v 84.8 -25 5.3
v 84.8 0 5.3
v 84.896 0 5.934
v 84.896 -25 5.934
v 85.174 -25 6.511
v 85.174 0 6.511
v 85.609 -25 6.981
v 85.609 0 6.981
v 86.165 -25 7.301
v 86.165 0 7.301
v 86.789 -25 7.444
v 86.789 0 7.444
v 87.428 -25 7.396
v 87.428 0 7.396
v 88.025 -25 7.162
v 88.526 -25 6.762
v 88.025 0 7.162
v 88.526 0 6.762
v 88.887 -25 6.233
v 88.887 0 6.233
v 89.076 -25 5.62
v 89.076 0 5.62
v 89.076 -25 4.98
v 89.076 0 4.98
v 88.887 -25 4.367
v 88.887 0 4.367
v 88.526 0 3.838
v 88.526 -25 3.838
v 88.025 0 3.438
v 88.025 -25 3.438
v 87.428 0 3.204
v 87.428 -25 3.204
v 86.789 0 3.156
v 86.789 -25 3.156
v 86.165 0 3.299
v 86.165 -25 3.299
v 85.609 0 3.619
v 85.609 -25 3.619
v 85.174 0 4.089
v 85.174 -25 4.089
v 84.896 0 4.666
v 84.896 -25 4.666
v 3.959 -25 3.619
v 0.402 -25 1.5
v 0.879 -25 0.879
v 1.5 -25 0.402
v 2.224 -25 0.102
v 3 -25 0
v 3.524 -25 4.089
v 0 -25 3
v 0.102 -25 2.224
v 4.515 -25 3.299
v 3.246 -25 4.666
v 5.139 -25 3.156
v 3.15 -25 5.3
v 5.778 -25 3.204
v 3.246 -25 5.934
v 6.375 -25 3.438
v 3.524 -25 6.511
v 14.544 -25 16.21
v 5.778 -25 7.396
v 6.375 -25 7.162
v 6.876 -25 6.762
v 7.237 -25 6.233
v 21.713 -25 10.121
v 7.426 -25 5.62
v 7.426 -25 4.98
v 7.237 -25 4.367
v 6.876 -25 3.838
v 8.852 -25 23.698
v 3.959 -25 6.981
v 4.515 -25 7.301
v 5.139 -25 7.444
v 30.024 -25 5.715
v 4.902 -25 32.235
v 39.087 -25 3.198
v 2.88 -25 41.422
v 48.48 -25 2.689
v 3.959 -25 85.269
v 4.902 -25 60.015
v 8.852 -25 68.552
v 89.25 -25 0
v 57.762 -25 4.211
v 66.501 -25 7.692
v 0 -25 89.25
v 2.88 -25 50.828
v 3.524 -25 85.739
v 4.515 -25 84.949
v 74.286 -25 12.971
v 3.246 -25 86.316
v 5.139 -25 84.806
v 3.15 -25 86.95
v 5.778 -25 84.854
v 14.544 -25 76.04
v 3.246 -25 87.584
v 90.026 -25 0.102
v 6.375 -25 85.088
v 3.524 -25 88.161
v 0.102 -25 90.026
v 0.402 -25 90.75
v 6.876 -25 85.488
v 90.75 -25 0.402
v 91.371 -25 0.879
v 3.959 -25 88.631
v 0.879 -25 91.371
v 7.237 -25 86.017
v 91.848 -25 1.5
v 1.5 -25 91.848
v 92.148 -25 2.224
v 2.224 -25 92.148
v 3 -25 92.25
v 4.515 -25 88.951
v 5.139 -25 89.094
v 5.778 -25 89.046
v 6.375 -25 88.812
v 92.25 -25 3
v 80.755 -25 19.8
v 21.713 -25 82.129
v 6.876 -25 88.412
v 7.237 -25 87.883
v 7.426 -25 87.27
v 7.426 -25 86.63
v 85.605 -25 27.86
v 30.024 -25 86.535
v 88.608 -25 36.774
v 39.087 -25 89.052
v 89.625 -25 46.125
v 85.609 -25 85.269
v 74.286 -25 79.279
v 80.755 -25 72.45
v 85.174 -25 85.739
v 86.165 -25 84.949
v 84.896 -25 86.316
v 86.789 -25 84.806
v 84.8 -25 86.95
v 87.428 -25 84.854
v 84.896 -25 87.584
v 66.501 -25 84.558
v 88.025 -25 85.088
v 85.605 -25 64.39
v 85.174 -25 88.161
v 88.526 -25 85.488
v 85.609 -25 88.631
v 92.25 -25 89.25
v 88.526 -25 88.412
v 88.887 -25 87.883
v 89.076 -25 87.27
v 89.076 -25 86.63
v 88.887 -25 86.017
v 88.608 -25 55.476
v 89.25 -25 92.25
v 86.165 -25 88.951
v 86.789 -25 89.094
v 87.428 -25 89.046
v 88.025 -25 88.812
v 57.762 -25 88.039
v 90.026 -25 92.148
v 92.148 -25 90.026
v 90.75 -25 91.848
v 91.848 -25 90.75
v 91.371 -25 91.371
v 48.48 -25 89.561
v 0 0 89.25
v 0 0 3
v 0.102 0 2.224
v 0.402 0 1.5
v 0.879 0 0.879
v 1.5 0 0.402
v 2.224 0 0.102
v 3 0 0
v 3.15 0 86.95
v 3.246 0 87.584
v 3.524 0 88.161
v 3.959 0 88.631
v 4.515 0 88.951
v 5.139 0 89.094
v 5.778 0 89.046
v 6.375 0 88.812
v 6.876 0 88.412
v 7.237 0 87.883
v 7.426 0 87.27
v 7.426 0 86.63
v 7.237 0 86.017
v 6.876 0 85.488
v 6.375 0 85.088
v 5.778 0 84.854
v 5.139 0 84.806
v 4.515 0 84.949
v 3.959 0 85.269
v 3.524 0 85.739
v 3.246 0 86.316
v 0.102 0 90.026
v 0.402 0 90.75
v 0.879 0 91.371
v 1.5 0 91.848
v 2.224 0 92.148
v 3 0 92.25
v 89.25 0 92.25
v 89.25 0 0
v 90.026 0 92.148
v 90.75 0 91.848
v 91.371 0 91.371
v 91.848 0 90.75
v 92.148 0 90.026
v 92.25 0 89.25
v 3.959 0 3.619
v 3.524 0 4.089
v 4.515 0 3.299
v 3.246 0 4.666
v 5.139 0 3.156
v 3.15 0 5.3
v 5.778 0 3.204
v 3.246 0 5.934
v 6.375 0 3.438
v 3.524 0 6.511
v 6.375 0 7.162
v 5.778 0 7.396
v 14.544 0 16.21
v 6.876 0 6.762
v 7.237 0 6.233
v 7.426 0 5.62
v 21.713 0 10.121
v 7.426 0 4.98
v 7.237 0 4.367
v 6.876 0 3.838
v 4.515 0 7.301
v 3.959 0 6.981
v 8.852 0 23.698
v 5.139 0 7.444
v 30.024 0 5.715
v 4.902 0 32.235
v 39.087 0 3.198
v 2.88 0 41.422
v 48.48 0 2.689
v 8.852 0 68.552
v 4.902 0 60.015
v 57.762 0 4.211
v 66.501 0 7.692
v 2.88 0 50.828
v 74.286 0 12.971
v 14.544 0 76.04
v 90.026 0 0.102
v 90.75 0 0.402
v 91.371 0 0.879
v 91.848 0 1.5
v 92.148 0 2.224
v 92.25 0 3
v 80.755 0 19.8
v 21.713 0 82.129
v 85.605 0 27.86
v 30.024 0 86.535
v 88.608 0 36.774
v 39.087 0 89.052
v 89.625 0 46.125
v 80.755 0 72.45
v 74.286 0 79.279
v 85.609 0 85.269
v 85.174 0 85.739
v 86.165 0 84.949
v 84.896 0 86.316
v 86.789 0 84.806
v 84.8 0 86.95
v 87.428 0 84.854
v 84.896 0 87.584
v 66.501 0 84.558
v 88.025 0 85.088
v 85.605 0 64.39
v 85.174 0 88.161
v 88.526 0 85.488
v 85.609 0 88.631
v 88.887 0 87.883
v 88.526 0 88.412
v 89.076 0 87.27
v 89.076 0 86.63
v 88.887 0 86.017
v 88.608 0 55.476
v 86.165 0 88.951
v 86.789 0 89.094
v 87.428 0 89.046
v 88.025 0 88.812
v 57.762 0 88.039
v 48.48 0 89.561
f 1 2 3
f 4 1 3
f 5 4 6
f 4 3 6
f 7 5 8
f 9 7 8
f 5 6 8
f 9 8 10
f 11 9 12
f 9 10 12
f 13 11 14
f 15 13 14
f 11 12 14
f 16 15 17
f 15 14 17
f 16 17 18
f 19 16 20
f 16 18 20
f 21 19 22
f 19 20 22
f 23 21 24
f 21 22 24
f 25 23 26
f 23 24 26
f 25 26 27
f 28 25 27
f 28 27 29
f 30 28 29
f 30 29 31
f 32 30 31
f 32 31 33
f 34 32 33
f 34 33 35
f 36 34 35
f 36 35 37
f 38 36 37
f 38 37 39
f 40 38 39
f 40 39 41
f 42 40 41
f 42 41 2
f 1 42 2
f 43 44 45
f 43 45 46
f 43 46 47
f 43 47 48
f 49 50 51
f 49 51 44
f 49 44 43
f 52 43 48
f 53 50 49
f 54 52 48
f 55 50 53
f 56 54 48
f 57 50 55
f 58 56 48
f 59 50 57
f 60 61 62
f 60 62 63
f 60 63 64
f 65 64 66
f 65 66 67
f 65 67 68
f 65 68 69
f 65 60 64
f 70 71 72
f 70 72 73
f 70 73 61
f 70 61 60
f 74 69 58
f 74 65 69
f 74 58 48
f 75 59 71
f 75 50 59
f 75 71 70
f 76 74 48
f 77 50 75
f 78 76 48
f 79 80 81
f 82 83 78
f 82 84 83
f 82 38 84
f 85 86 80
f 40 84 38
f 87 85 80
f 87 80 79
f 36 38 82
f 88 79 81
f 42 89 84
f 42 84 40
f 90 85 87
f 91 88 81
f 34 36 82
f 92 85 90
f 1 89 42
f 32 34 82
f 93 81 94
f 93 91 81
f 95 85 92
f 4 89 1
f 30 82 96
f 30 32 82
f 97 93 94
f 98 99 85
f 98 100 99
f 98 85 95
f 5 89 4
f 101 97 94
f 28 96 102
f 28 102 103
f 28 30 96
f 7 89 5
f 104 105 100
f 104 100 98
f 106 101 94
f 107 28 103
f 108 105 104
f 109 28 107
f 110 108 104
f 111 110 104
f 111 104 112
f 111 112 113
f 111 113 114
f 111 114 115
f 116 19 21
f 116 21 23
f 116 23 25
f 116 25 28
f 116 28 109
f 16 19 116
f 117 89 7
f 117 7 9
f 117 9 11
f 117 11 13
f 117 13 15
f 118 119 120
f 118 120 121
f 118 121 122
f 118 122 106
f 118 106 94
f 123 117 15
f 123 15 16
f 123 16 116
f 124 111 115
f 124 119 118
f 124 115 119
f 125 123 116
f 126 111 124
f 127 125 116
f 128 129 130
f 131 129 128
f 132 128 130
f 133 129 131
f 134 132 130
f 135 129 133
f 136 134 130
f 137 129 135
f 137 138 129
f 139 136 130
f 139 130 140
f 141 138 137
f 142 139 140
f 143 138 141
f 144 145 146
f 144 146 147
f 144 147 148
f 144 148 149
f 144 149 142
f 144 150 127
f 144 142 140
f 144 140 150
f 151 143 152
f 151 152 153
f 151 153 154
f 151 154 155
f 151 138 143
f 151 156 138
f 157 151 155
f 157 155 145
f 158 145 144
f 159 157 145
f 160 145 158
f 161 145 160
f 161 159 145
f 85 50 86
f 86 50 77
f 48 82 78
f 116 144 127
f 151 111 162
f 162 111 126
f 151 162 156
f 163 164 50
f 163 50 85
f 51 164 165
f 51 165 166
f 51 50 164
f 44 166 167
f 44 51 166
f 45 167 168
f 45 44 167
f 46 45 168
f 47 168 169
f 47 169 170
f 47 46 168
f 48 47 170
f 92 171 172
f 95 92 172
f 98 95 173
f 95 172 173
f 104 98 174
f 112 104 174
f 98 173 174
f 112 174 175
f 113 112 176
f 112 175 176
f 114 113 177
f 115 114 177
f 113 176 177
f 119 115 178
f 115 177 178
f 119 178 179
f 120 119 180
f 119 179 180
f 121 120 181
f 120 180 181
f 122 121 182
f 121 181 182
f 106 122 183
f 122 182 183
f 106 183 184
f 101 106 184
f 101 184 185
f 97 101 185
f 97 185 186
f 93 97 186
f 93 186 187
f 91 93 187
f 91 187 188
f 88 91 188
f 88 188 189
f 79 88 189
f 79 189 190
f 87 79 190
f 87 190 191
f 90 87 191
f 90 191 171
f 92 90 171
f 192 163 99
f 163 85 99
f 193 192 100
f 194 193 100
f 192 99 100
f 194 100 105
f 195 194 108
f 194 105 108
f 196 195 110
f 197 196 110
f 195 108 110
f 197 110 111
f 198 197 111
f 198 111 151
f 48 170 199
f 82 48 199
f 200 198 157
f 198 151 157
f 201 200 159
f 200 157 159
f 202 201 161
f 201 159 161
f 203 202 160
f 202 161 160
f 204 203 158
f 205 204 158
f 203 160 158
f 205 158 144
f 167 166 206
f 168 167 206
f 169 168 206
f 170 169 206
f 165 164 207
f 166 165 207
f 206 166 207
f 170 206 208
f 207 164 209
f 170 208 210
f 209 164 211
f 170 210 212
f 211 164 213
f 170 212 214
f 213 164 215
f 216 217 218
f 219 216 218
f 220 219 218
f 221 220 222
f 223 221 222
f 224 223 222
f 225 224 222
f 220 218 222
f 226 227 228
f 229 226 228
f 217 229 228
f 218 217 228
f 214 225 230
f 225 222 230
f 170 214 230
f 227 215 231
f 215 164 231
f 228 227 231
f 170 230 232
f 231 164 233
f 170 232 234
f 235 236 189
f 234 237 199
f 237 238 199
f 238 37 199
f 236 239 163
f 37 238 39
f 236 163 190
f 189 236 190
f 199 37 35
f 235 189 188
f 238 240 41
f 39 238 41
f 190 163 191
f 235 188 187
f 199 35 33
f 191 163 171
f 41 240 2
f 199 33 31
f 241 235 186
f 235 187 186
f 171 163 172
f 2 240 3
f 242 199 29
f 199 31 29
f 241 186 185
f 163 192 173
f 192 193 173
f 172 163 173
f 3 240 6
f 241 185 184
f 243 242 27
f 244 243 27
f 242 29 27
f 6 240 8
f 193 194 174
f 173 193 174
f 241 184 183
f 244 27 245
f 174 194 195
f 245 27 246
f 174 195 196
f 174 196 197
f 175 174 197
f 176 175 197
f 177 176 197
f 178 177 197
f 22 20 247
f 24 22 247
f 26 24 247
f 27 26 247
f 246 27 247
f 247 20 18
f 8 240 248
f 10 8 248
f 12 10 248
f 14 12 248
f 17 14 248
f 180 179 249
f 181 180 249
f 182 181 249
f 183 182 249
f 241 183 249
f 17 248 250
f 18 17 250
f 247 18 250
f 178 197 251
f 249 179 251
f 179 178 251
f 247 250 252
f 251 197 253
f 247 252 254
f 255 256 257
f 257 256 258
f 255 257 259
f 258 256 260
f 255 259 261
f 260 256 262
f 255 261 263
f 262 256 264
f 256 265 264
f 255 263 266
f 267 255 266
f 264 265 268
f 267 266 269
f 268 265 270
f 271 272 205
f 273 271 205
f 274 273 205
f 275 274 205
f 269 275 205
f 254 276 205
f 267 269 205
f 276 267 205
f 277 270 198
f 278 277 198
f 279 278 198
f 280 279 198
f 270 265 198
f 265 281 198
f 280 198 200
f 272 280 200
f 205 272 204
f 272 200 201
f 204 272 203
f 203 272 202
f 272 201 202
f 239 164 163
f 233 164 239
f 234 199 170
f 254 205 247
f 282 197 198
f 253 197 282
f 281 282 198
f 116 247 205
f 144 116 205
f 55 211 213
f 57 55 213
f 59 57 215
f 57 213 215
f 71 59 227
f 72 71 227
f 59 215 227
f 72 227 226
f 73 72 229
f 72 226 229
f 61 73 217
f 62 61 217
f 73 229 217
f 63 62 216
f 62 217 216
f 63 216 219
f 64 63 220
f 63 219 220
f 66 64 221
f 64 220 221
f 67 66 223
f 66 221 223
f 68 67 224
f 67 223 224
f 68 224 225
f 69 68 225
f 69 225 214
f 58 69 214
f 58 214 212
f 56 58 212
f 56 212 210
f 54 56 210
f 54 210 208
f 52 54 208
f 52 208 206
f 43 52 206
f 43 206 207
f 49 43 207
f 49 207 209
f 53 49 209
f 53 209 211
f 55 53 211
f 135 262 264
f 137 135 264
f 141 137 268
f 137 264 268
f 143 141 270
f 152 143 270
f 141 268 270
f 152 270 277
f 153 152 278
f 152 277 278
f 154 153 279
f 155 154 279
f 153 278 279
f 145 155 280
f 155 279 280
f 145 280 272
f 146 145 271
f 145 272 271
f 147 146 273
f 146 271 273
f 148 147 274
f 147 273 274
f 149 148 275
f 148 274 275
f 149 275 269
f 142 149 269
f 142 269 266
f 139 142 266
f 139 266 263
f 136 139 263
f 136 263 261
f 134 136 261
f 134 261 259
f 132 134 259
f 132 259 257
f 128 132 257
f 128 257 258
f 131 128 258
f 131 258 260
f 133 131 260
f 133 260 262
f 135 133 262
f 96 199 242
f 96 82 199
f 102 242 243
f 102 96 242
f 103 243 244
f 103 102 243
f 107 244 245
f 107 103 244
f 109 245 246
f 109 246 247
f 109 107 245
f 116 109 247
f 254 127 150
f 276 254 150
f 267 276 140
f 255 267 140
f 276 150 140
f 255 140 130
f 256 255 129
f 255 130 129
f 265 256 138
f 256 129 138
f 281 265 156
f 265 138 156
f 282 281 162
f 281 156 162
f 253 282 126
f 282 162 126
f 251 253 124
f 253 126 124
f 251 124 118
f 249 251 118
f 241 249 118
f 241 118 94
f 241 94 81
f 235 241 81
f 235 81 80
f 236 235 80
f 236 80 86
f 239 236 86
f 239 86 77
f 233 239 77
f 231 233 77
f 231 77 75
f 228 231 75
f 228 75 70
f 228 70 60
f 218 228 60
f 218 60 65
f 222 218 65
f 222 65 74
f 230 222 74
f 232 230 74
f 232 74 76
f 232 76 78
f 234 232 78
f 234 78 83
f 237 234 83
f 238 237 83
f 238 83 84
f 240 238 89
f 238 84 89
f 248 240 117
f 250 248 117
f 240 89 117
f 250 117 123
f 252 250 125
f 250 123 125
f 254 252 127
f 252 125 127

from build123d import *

# Parameters (mm, degrees)
F0_W     = 92.25
F0_H     = 92.25
F1_DEPTH = 25
F2_R     = 43.5
F3_DEPTH = 25.001
F5_D     = 4.3
F6_R     = 3


with BuildPart() as f1:
    # F0 (on Front) → F1 (new body)
    with BuildSketch(Plane.XZ):
        with Locations((46.125, 46.125)):
            Rectangle(F0_W, F0_H)
    extrude(amount=F1_DEPTH)

    # F2 (on face) → F3 (cut, through all)
    with BuildSketch(Plane.XZ.offset(25)):
        with Locations((46.125, 46.125)):
            Circle(F2_R)
    extrude(amount=-F3_DEPTH, mode=Mode.SUBTRACT)

    # F5 (through all)
    with Locations(Plane.XZ.offset(25)):
        with Locations((5.3, 86.95), (5.3, 5.3), (86.95, 5.3), (86.95, 86.95)):
            Hole(F5_D / 2)

    # F6
    f6_edges = [f1.edges().sort_by_distance(p)[0] for p in [
        (92.25, -12.5, 92.25),
        (0, -12.5, 92.25),
        (0, -12.5, 0),
        (92.25, -12.5, 0),
    ]]
    fillet(f6_edges, radius=F6_R)


solid = f1.part
